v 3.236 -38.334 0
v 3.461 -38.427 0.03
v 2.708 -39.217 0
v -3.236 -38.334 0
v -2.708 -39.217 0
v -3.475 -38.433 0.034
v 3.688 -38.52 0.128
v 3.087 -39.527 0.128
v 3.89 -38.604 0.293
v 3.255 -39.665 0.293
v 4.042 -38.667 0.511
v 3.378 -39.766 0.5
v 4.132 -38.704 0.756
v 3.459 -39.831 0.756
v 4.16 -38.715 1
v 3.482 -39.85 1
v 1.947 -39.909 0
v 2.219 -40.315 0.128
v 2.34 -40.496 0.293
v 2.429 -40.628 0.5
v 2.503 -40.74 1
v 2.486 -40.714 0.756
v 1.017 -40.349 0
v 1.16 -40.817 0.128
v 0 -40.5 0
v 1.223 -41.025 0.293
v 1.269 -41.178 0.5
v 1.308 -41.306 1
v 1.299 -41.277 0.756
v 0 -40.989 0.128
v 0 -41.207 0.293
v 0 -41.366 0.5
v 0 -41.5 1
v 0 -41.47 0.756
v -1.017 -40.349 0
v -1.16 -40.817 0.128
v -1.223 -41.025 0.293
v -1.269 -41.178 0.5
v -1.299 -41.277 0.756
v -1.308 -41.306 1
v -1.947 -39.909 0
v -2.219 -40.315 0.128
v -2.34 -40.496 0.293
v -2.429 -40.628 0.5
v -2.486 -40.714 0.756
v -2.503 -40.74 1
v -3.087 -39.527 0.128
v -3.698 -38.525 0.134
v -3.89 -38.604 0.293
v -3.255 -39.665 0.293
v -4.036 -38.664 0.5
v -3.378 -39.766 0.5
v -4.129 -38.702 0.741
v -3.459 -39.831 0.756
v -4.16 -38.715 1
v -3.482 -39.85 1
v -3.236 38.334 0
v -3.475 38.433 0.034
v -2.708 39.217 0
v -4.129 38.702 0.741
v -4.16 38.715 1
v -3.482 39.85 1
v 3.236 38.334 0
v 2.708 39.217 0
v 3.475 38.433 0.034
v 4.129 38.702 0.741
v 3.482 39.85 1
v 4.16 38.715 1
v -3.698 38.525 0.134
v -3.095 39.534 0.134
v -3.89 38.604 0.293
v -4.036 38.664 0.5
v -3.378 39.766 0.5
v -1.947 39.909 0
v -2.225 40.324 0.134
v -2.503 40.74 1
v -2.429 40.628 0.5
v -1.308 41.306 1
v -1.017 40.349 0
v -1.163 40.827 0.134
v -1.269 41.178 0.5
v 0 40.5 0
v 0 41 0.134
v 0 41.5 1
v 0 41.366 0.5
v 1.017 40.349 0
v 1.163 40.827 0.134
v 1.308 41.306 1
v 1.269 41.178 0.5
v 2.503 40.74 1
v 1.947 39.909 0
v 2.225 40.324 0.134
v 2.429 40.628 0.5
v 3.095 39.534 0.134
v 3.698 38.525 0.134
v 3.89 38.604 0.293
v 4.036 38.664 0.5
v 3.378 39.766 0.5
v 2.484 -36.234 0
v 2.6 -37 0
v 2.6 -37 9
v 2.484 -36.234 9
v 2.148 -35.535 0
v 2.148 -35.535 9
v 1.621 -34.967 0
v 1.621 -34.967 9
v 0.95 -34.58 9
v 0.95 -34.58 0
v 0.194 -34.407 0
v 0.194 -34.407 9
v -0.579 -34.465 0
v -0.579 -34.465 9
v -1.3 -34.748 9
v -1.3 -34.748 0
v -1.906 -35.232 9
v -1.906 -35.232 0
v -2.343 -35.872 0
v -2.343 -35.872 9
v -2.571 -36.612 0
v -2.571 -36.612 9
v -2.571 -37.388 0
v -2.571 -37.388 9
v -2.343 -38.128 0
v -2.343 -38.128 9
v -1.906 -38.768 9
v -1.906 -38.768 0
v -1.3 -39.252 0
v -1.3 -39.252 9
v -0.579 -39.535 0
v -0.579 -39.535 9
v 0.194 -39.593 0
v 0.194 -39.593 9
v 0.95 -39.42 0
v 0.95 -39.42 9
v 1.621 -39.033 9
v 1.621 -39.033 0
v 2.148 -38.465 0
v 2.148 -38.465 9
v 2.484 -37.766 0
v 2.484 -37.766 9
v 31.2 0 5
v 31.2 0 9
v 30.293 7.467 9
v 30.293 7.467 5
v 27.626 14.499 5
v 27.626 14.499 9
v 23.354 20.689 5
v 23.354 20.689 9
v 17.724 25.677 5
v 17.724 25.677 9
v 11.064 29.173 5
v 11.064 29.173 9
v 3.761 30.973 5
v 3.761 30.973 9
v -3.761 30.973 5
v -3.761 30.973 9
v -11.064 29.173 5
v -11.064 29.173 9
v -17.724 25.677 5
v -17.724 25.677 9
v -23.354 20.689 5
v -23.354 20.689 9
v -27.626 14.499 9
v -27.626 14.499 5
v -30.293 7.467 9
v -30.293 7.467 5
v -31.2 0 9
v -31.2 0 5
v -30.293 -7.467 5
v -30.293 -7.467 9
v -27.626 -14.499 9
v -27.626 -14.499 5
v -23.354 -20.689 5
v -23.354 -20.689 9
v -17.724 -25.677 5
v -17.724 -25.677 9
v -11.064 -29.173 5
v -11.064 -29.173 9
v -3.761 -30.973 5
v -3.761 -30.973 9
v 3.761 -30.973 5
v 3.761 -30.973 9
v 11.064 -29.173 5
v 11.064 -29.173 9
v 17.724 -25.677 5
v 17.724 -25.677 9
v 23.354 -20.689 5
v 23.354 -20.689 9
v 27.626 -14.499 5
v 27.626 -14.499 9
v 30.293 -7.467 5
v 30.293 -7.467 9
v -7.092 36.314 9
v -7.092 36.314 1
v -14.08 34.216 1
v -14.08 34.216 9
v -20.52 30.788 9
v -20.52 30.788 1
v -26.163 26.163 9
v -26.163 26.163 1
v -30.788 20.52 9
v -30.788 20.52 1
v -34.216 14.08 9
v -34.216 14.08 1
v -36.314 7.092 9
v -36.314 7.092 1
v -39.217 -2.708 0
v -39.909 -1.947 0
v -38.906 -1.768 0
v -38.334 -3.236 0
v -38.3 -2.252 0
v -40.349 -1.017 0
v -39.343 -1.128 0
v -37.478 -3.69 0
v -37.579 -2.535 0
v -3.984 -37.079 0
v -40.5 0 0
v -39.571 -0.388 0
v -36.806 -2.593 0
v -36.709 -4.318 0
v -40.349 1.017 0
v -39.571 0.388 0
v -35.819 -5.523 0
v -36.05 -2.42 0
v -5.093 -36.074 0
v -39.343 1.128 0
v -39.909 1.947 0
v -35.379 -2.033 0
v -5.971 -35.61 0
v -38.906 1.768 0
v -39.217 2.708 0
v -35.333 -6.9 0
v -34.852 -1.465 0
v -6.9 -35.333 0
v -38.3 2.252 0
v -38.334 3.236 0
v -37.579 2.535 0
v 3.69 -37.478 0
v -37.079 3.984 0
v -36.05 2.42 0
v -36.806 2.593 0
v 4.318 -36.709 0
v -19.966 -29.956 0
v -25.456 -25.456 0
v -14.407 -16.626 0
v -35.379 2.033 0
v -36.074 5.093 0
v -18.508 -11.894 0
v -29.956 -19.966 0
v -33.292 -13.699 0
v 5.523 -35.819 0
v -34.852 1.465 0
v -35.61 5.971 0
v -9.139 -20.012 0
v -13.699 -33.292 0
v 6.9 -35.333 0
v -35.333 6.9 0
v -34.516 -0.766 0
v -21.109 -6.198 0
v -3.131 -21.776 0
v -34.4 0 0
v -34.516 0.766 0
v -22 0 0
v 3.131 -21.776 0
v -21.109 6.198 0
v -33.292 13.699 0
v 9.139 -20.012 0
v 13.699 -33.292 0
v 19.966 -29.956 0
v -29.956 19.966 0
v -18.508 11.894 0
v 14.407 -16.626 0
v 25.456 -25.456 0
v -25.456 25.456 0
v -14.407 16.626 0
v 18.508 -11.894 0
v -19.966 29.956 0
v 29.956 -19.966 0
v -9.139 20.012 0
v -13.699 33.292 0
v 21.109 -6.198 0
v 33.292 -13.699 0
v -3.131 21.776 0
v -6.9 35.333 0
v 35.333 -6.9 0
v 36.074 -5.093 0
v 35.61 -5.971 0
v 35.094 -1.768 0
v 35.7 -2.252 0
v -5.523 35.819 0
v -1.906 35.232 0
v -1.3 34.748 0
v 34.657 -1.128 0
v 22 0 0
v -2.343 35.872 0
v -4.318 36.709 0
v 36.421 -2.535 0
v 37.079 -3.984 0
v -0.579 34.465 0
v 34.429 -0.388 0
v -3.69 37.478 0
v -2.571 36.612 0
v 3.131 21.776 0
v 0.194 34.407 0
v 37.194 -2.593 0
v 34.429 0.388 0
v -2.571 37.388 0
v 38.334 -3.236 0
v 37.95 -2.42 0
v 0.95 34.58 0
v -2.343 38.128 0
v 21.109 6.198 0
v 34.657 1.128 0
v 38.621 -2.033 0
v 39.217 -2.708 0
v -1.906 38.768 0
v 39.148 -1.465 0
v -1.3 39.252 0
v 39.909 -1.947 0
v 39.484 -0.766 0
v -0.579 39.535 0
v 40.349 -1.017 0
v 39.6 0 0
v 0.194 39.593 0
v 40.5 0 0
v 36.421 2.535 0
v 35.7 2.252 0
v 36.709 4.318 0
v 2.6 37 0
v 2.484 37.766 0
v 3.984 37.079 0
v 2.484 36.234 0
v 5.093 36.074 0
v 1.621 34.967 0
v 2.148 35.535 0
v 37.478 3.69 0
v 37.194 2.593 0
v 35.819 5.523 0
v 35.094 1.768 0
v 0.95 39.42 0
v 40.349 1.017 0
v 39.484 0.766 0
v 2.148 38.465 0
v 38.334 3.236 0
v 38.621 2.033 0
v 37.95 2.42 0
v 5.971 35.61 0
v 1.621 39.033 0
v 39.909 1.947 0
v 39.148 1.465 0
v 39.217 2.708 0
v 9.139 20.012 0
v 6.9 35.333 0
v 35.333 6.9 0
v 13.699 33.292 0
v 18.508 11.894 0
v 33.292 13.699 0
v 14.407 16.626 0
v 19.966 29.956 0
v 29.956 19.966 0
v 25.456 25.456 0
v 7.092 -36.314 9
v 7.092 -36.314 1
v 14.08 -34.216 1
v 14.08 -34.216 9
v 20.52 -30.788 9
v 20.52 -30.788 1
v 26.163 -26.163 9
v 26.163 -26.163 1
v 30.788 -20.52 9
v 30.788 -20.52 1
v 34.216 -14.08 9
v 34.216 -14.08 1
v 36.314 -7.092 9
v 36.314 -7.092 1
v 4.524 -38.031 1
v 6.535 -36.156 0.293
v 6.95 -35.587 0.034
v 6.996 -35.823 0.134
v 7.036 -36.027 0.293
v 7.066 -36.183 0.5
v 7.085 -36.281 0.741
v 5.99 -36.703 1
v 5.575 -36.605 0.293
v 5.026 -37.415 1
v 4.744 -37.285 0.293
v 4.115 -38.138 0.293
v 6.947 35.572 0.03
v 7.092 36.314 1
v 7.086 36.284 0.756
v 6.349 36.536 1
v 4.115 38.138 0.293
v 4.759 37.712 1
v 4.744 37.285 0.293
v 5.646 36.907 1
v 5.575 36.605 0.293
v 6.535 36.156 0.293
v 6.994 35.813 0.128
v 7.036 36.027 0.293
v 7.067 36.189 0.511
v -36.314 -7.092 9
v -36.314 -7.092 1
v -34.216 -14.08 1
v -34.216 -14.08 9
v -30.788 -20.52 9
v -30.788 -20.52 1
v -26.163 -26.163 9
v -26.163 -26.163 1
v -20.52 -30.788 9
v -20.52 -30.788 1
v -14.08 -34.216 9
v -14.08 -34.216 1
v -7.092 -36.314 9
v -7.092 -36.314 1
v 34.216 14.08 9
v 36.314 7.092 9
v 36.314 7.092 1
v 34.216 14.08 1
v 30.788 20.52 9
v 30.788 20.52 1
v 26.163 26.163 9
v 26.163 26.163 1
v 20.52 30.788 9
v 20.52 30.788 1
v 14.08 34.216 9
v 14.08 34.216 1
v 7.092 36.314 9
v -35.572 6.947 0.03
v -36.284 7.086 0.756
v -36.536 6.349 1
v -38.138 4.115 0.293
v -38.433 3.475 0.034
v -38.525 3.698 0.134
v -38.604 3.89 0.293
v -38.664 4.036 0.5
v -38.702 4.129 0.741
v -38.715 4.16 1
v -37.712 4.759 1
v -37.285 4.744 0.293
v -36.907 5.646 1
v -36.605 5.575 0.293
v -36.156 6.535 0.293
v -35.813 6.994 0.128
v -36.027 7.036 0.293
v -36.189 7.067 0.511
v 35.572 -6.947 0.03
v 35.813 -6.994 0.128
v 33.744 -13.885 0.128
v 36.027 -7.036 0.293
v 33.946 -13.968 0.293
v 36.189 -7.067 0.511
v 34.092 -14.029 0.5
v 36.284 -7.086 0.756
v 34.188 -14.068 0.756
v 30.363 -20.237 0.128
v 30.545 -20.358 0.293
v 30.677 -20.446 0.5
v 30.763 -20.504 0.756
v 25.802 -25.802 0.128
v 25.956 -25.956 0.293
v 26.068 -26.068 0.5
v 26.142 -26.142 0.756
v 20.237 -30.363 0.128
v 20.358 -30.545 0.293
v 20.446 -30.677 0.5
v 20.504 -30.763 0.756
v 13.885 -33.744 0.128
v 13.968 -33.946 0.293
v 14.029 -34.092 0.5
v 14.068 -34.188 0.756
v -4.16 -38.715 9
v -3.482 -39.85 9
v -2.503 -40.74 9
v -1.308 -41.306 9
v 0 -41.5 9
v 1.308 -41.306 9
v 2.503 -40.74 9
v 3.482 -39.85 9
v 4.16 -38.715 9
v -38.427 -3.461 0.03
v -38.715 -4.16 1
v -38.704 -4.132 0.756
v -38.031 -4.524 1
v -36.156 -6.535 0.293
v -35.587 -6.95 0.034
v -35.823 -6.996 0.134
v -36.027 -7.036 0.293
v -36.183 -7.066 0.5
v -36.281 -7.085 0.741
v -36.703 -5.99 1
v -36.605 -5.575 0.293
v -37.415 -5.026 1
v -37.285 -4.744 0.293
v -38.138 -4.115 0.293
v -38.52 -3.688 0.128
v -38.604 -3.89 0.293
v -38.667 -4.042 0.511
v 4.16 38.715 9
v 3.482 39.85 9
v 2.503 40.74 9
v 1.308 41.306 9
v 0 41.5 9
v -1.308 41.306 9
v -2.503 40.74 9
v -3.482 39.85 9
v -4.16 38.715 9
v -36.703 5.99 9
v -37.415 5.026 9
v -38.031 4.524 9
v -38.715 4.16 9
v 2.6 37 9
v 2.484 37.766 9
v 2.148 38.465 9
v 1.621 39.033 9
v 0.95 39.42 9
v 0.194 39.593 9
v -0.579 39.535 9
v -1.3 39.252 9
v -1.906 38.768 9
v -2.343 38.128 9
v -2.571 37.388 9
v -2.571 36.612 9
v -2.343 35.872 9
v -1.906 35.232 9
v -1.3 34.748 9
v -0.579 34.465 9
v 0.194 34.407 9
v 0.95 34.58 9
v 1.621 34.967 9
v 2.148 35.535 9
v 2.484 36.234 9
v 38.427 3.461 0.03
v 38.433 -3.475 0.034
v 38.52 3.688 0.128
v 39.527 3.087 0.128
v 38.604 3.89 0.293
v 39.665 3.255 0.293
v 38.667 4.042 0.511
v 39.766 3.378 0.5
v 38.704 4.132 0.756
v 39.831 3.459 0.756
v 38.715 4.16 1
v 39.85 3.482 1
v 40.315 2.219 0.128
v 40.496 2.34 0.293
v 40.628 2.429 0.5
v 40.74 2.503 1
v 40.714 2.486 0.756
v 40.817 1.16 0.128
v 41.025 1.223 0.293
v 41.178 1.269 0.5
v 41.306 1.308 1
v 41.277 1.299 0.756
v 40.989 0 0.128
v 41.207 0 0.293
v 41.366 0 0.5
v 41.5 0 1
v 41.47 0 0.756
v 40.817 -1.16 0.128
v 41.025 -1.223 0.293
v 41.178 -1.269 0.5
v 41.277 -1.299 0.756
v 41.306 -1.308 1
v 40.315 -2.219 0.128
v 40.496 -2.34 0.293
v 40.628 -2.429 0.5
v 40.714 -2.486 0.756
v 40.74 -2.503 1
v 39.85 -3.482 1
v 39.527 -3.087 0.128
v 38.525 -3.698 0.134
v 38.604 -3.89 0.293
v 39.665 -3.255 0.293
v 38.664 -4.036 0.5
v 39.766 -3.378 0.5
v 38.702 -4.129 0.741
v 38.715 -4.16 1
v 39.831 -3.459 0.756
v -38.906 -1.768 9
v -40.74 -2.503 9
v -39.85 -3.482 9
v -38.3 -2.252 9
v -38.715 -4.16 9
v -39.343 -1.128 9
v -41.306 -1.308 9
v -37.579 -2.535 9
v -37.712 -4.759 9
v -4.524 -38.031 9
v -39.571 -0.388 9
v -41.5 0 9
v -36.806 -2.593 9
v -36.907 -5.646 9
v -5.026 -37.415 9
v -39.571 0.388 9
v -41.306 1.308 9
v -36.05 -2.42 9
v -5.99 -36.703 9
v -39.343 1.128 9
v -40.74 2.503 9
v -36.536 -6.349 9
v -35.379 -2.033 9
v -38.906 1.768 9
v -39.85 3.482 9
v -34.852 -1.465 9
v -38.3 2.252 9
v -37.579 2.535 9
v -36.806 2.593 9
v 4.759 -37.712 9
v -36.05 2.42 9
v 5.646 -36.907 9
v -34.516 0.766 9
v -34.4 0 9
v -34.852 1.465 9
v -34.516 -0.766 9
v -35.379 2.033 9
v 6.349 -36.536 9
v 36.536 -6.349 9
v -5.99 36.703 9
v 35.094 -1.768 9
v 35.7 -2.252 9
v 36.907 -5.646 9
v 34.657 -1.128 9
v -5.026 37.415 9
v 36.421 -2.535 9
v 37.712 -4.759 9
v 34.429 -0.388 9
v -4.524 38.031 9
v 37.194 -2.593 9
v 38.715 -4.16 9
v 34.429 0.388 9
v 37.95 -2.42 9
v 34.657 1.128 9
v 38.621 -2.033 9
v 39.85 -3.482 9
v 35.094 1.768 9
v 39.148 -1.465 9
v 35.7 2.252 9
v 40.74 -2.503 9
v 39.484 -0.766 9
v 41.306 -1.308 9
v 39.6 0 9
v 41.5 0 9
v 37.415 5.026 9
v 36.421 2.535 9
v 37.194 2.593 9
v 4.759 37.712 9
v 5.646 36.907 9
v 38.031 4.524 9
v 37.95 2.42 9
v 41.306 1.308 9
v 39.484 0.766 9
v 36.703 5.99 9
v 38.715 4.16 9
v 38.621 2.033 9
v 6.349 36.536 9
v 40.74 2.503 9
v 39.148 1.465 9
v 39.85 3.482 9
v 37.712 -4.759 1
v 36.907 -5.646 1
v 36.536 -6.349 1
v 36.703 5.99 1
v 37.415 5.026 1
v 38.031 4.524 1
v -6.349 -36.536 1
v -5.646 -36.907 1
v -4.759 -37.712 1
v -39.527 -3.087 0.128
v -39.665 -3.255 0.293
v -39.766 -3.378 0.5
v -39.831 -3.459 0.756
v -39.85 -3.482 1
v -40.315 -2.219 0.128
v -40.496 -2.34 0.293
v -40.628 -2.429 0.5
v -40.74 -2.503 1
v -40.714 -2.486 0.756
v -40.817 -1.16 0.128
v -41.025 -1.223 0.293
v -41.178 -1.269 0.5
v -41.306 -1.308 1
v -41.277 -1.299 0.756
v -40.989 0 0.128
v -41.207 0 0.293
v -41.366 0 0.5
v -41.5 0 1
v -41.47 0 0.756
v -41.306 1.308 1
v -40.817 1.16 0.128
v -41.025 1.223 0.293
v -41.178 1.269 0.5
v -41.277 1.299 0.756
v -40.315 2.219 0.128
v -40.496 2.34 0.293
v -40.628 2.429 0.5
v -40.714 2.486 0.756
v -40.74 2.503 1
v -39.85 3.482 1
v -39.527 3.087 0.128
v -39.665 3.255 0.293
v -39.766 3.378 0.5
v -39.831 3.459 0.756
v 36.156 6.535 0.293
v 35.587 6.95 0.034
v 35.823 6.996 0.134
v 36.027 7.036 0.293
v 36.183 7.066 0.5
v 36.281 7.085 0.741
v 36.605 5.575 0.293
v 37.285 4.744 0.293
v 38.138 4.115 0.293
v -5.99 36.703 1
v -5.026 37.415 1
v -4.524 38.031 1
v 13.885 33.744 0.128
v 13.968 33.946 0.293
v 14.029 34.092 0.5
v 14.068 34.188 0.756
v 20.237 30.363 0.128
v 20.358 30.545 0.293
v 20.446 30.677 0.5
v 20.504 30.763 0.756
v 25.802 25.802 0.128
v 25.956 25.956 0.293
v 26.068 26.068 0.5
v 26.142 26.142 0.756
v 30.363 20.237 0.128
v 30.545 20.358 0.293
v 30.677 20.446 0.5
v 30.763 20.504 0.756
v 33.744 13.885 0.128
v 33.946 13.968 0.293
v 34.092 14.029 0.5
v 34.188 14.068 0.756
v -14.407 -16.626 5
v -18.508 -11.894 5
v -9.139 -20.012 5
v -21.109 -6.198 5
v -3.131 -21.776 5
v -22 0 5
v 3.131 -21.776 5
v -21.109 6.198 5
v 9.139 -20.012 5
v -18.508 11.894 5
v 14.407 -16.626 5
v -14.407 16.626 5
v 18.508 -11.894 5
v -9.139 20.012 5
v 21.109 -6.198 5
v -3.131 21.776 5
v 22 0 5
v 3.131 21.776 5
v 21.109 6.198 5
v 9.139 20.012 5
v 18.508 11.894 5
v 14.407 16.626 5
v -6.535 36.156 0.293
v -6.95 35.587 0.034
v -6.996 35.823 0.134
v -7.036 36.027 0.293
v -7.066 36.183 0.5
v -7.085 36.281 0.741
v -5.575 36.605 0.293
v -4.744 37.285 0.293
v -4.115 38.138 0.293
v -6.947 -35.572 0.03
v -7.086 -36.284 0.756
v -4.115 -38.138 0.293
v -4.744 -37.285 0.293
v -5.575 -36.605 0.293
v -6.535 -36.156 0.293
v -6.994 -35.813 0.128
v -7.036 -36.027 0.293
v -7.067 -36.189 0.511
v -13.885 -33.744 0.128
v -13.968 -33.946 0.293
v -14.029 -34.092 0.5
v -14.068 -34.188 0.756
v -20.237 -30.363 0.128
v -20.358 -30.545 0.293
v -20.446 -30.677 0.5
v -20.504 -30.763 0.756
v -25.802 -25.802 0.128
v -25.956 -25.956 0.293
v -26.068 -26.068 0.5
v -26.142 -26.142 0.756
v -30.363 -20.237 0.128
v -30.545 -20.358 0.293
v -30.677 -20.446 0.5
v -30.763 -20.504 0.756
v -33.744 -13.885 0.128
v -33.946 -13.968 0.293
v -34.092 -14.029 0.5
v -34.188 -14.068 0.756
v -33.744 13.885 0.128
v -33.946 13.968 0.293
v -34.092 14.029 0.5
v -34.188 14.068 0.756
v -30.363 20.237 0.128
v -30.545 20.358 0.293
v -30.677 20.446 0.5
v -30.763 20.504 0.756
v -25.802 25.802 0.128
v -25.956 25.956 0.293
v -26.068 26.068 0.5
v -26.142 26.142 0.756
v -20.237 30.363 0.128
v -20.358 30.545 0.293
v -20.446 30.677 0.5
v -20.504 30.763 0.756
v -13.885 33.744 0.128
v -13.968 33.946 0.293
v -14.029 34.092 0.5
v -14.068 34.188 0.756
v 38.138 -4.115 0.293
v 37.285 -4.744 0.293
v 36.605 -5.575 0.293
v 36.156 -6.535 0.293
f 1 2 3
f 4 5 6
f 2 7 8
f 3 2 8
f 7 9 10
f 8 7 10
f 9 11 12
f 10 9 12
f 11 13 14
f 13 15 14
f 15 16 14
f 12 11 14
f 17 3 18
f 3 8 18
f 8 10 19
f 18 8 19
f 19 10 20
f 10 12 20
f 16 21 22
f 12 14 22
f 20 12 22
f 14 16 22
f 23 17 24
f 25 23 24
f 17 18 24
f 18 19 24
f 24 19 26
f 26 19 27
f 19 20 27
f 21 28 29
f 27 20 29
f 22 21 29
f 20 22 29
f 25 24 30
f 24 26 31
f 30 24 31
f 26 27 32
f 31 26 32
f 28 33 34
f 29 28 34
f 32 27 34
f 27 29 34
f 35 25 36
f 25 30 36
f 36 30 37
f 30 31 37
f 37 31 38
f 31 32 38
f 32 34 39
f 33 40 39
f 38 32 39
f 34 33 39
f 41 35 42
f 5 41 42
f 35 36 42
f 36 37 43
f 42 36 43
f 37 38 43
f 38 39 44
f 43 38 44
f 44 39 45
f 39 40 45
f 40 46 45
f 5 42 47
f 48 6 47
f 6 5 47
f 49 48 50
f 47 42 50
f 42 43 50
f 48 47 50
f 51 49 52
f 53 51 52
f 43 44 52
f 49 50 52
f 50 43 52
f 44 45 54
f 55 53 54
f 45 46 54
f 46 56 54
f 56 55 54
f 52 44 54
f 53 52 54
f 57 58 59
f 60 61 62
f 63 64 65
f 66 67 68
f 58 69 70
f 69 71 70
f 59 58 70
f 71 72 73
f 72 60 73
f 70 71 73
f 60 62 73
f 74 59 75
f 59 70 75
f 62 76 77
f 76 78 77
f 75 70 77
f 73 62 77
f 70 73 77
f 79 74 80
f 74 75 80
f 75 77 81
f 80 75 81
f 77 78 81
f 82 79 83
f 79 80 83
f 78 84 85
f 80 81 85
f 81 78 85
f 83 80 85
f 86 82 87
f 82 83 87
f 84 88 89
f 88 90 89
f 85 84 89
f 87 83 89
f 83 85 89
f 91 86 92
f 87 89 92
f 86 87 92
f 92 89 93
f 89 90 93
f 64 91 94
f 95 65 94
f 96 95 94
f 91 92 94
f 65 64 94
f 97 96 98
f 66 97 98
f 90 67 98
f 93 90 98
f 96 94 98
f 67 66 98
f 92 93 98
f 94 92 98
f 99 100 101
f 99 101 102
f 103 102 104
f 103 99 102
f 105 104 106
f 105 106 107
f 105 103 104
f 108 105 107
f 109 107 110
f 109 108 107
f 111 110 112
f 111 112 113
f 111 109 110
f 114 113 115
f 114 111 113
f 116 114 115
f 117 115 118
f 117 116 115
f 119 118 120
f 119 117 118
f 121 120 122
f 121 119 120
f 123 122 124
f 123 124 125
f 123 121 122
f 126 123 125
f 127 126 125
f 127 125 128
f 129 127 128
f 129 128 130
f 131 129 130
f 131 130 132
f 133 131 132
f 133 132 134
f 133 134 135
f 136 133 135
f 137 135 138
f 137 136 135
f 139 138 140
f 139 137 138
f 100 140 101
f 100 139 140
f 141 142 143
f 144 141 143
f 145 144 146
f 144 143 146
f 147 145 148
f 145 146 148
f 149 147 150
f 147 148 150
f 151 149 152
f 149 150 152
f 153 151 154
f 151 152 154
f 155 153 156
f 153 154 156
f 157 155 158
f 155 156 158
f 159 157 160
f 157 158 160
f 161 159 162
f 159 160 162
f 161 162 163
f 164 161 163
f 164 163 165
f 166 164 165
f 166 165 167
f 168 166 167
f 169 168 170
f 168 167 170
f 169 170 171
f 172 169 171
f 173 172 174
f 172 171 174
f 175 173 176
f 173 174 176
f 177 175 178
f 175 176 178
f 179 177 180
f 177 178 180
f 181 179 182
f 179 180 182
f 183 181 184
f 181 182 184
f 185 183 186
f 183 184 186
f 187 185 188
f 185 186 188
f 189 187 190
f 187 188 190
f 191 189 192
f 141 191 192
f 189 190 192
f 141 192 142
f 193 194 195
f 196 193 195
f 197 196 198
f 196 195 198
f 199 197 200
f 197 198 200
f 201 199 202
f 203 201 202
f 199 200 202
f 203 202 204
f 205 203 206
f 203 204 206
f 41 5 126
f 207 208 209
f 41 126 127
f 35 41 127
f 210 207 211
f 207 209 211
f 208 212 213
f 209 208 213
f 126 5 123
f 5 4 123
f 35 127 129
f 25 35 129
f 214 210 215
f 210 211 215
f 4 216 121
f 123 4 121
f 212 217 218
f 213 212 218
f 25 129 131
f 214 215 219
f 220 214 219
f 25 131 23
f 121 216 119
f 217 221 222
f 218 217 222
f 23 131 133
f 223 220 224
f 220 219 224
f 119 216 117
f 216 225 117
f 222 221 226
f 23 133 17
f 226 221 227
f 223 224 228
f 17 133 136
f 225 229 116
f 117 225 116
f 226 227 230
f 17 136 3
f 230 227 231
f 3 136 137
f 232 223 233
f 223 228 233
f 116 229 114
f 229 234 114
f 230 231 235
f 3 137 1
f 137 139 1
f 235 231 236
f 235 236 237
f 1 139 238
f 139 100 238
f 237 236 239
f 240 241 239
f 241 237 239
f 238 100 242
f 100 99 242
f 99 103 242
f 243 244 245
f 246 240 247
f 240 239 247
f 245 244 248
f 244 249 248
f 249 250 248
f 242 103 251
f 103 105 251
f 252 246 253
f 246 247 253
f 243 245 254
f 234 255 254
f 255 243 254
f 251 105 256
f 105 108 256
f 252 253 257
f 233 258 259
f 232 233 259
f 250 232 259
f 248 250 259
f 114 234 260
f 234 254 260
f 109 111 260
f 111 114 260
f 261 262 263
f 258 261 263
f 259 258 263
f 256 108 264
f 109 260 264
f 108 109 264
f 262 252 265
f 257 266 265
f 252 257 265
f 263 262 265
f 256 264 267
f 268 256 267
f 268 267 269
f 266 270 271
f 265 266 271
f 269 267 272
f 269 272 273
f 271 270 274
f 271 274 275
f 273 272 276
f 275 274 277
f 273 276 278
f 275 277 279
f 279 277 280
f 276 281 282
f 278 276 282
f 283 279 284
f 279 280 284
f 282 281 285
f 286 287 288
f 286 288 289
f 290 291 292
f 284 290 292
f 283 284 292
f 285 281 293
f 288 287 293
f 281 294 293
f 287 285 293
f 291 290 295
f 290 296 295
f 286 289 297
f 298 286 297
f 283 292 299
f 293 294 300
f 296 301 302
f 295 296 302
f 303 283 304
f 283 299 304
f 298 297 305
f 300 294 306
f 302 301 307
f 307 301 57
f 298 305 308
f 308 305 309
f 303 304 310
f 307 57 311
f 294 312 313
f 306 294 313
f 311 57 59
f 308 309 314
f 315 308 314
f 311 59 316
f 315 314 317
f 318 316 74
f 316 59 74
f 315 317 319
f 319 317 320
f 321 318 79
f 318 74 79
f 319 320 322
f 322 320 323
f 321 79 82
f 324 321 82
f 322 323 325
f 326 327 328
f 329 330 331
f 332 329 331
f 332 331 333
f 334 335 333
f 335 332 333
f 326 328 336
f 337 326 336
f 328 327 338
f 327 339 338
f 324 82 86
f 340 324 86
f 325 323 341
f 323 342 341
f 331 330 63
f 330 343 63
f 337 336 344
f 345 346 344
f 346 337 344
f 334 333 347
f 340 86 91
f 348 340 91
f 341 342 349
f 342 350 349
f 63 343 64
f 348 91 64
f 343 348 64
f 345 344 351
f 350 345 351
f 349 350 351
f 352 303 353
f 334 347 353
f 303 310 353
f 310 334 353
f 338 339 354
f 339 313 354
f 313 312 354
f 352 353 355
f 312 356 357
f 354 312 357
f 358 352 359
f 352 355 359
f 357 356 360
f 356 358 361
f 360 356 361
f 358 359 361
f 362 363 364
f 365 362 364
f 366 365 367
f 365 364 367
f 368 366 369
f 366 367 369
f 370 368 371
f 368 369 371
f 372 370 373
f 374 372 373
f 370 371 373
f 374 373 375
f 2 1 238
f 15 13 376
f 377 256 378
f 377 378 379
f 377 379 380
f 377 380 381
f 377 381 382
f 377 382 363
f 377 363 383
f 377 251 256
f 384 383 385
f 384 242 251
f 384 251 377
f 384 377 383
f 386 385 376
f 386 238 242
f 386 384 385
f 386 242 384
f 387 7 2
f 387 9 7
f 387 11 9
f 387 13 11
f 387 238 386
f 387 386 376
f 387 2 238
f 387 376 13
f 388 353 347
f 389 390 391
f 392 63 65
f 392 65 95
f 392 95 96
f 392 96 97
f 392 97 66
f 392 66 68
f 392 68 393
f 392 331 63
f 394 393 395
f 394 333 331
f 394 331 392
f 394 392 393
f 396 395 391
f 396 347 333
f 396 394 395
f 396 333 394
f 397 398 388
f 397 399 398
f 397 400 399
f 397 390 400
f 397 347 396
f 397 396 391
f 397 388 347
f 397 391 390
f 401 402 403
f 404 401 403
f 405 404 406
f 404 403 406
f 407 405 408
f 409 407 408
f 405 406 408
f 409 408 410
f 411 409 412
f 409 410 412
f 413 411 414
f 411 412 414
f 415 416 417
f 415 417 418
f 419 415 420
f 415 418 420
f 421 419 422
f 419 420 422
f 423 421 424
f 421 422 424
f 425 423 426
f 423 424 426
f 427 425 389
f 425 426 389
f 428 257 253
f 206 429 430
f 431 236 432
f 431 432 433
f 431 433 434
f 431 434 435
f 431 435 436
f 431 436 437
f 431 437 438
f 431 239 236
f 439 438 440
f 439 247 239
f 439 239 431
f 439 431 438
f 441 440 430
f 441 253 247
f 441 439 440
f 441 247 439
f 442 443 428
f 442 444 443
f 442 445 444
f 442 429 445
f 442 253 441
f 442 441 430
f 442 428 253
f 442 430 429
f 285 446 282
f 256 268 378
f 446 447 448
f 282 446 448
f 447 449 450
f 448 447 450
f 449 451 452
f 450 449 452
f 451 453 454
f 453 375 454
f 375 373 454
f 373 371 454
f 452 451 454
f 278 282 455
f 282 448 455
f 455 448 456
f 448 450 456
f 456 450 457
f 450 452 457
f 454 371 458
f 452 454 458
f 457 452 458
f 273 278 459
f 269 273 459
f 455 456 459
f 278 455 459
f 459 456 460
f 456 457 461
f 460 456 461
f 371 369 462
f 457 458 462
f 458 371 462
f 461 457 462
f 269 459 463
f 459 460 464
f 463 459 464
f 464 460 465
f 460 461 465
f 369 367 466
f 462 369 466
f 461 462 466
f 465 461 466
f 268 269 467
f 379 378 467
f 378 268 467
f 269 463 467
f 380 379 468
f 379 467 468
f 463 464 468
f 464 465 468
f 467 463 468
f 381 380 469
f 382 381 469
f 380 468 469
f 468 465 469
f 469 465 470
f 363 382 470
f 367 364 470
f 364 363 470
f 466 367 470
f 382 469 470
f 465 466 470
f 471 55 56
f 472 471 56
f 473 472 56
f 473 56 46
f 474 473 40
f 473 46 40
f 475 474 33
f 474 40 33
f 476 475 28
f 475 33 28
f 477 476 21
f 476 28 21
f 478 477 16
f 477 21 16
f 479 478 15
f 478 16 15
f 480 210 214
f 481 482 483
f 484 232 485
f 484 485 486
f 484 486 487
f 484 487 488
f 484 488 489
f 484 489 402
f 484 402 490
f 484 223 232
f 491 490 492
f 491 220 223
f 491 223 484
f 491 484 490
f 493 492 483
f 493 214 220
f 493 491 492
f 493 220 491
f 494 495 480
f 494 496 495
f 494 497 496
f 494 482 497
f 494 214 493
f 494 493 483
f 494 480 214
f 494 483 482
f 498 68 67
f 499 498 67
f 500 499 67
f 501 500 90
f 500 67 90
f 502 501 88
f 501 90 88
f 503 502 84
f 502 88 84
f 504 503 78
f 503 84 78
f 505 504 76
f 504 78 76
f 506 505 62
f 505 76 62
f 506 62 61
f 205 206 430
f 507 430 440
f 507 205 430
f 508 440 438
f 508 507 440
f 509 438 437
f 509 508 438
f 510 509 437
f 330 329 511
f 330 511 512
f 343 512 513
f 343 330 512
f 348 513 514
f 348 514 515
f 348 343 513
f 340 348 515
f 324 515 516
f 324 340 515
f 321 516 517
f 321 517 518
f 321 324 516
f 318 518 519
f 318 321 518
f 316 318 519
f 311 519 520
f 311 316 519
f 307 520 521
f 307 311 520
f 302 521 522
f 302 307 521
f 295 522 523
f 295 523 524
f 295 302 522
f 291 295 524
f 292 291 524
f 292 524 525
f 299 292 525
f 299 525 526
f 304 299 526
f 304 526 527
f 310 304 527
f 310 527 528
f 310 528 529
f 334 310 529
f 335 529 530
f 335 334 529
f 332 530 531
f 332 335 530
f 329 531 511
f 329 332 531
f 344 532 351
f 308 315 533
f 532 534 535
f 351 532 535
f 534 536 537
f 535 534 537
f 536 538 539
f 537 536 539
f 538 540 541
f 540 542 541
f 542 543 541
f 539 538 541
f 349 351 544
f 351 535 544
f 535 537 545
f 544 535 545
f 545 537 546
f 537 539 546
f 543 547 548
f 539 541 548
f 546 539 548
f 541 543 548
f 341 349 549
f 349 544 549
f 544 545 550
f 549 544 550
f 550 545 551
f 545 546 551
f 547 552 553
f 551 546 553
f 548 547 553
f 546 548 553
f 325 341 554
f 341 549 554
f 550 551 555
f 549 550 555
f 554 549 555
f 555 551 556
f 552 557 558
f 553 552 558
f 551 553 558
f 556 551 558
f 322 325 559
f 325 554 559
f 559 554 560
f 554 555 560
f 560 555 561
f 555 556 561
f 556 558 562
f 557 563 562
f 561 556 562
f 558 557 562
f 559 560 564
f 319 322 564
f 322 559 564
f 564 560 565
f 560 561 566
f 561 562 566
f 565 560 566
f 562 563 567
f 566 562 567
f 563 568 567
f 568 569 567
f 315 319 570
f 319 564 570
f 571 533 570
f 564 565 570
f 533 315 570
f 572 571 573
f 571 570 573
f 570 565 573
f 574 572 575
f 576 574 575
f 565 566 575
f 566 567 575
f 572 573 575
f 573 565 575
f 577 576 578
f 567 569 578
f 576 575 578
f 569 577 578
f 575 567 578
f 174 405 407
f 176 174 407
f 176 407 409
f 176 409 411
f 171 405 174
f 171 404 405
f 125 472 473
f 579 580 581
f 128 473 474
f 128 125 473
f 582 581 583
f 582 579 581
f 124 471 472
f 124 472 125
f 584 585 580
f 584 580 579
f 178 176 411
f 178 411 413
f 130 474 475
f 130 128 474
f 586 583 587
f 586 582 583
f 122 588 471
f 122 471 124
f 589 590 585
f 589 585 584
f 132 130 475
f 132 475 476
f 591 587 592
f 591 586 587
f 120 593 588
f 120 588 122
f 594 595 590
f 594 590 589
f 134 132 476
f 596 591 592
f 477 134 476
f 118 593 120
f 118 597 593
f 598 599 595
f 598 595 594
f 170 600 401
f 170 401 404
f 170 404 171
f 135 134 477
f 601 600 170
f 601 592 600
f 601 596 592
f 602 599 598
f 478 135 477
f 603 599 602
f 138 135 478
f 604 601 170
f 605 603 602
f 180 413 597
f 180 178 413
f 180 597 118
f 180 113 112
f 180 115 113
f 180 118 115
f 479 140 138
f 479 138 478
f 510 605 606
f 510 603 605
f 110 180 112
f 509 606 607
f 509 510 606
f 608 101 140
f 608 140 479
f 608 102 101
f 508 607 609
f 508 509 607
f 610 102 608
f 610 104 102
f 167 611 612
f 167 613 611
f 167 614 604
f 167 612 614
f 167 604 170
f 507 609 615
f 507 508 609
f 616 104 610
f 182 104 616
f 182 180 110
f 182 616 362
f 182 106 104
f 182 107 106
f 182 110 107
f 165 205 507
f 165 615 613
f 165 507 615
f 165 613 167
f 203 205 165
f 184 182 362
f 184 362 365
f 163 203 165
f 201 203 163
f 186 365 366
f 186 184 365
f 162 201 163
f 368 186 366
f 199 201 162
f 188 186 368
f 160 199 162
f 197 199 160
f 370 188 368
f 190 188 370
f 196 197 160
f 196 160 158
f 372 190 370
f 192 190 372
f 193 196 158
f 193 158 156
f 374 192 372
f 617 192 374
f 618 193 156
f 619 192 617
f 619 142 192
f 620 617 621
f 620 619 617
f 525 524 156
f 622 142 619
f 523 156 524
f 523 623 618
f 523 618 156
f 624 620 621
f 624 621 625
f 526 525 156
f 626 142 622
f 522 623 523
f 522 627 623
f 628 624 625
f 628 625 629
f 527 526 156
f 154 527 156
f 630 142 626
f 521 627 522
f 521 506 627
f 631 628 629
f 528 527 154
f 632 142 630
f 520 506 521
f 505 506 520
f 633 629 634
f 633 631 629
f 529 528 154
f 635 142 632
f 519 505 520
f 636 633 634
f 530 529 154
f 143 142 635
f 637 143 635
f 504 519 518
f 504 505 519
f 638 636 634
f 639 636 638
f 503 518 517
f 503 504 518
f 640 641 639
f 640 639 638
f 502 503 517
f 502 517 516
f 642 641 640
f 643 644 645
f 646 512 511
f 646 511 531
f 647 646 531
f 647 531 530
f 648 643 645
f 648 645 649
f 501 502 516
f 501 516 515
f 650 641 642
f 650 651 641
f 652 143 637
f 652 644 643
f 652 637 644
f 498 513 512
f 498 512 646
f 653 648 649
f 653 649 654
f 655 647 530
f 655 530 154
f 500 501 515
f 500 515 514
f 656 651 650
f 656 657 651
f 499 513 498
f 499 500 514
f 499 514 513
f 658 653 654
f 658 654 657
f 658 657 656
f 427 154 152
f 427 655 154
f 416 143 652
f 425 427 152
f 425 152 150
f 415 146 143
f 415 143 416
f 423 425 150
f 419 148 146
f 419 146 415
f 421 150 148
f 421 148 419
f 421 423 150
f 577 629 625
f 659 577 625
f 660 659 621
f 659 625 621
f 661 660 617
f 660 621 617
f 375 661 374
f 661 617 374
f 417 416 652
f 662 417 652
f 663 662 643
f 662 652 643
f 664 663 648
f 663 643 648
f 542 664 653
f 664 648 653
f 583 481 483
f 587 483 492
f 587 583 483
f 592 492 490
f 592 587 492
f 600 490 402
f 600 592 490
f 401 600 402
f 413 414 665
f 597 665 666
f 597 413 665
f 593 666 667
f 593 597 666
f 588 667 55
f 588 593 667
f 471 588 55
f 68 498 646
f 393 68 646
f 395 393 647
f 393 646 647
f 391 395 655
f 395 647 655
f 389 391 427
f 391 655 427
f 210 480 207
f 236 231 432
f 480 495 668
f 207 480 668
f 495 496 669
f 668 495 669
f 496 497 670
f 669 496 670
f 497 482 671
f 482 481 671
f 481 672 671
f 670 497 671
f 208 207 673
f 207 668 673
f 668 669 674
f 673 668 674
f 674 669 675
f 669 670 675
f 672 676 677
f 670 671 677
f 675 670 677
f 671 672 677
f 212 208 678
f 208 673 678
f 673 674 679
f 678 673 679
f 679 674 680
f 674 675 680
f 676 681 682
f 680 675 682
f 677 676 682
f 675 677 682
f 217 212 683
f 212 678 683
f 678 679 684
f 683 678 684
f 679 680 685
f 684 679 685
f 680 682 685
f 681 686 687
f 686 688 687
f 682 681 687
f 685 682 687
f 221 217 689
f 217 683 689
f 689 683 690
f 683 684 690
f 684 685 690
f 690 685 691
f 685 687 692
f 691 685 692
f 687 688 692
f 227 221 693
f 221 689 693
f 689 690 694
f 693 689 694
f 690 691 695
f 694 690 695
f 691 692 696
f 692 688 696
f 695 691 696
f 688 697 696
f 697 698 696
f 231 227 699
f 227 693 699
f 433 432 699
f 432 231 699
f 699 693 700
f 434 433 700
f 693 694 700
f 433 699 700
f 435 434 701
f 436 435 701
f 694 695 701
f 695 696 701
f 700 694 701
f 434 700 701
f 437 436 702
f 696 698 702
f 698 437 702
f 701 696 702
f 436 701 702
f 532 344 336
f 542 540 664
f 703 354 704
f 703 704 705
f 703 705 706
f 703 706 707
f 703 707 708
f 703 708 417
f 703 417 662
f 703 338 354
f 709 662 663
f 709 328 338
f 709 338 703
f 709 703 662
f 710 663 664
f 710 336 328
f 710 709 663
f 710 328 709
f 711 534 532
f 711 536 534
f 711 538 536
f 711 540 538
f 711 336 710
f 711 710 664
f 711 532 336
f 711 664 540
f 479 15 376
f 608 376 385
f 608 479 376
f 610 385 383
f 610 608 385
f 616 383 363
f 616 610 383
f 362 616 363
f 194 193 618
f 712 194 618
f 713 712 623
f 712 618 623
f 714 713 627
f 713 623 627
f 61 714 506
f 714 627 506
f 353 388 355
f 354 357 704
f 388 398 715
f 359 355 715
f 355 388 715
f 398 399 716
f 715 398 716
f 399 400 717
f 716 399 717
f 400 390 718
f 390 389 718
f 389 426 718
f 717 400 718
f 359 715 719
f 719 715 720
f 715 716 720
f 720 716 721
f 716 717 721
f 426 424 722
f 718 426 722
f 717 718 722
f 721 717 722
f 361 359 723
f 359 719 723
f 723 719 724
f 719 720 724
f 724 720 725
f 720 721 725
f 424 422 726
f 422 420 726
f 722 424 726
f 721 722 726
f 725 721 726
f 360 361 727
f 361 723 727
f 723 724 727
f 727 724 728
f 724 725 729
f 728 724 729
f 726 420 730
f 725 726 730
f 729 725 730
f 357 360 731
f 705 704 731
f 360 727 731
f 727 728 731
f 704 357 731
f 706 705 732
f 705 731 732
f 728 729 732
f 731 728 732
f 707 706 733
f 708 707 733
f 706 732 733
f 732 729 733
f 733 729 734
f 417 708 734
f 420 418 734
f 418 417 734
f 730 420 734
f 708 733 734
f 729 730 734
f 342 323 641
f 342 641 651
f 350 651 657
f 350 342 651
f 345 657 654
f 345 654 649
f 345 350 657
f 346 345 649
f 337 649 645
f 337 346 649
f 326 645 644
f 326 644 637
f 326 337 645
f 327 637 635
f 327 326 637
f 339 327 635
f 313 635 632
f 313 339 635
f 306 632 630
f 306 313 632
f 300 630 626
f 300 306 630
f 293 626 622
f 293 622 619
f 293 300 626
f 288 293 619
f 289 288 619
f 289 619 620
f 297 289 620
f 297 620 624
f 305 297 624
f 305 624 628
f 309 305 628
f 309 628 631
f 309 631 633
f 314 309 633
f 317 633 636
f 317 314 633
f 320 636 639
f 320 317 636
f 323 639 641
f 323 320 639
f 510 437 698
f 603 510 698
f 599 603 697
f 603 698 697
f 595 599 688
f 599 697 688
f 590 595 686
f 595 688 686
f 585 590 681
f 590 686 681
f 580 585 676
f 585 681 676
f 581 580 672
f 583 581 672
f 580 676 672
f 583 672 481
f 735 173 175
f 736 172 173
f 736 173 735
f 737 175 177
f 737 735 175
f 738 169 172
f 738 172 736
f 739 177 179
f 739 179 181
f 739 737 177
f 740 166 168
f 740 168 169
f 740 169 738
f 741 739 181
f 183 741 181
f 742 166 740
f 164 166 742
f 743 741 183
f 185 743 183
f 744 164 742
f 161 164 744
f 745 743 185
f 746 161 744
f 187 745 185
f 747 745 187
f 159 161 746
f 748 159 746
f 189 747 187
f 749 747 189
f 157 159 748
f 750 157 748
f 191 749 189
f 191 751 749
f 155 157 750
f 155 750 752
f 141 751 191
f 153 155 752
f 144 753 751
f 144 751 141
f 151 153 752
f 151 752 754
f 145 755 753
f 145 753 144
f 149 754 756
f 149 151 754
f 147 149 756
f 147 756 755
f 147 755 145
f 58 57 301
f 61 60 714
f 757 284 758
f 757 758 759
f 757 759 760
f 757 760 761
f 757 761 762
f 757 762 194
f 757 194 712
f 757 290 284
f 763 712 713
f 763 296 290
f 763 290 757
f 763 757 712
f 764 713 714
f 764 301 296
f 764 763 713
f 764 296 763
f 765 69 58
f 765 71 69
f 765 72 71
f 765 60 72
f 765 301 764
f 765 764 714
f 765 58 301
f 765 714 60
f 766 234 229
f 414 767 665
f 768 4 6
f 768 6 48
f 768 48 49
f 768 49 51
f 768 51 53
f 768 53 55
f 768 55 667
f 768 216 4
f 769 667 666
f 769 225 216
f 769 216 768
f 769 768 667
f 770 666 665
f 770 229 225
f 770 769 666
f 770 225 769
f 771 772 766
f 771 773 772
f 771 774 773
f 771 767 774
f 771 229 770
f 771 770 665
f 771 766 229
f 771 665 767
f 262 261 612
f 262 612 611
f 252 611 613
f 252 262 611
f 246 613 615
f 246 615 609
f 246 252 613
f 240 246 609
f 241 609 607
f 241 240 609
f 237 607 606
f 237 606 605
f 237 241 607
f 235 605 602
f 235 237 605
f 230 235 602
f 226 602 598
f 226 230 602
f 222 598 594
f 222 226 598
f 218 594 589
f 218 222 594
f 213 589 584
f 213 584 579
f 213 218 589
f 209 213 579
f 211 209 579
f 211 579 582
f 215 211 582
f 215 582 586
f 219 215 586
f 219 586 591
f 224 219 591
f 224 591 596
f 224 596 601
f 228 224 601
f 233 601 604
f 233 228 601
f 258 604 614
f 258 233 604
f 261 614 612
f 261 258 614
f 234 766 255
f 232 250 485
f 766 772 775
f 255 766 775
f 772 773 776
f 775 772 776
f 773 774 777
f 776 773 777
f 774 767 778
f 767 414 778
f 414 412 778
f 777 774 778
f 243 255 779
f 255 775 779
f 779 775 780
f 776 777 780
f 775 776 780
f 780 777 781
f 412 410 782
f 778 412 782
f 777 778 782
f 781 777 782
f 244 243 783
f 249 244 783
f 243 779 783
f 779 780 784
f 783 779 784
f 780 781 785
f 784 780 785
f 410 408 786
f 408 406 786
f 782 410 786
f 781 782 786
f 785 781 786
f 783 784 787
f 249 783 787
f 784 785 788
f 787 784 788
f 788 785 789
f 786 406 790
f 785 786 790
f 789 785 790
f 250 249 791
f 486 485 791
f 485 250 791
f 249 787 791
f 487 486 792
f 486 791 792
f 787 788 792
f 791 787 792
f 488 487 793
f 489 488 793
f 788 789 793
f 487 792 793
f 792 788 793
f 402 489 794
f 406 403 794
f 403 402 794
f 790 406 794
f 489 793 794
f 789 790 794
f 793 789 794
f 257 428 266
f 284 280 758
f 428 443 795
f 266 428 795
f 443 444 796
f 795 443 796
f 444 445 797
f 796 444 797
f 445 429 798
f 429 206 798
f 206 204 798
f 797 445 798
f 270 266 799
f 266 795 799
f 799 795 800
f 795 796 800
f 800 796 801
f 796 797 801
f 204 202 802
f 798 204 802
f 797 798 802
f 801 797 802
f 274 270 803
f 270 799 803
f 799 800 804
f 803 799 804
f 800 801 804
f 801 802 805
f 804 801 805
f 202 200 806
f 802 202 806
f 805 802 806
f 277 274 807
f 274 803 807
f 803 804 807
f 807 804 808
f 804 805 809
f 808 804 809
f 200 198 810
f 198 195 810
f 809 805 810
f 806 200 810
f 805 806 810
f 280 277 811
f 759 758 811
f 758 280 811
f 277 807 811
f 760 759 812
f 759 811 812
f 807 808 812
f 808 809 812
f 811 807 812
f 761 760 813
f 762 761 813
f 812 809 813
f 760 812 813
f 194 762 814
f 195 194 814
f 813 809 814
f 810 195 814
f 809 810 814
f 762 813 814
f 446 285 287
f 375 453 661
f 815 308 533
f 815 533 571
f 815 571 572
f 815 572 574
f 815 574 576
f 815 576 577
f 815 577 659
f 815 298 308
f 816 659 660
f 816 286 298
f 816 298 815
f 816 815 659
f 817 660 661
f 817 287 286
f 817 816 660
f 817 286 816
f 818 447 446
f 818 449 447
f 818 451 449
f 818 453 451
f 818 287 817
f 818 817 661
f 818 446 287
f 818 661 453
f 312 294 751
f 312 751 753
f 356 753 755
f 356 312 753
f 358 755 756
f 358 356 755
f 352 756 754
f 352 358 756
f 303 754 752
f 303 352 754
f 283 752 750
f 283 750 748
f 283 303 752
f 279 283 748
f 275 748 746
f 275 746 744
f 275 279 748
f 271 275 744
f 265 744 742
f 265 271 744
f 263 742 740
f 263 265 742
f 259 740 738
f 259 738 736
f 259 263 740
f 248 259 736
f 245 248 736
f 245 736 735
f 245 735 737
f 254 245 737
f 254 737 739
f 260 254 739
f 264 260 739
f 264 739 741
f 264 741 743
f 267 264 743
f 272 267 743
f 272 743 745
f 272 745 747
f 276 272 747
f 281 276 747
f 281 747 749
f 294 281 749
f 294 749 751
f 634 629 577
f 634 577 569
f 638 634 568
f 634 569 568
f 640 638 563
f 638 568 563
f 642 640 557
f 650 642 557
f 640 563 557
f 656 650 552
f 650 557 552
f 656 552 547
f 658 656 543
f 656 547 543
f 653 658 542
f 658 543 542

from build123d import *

# Parameters (mm, degrees)
SKETCH_R      = 22
SKETCH_R_2    = 2.6
PAD_DEPTH     = 9
SKETCH001_R   = 31.2
SKETCH001_R_2 = 22
POCKET_DEPTH  = 4
FILLET_R      = 4
FILLET001_R   = 1


with BuildPart() as part:
    # Sketch → Pad (new body)
    with BuildSketch(Plane.XY):
        with BuildLine():
            ThreePointArc((-4.5, 36.725332), (-26.162951, 26.162951), (-36.725332, 4.5))
            Line((-37.000025, 4.5), (-36.725332, 4.5))
            ThreePointArc((-37.000025, 4.5), (-41.5, 0), (-37.000025, -4.5))
            Line((-37.000025, -4.5), (-36.725332, -4.5))
            ThreePointArc((-36.725332, -4.5), (-26.162951, -26.162951), (-4.5, -36.725332))
            Line((-4.5, -36.725332), (-4.5, -37))
            ThreePointArc((-4.5, -37), (0, -41.5), (4.5, -37.000001))
            Line((4.5, -36.725332), (4.5, -37.000001))
            ThreePointArc((4.5, -36.725332), (26.162951, -26.162951), (36.725332, -4.5))
            Line((36.725332, -4.5), (37.000003, -4.5))
            ThreePointArc((37.000003, -4.5), (41.5, 0), (37.000003, 4.5))
            Line((36.725332, 4.5), (37.000003, 4.5))
            ThreePointArc((36.725332, 4.5), (26.162951, 26.162951), (4.5, 36.725332))
            Line((4.5, 36.999999), (4.5, 36.725332))
            ThreePointArc((4.5, 36.999999), (1.1e-05, 41.5), (-4.5, 37.000021))
            Line((-4.5, 37.000021), (-4.5, 36.725332))
        make_face()
        Circle(SKETCH_R, mode=Mode.SUBTRACT)
        with Locations((0, 37)):
            Circle(SKETCH_R_2, mode=Mode.SUBTRACT)
        with Locations((0, -37)):
            Circle(SKETCH_R_2, mode=Mode.SUBTRACT)
        with Locations((-37, 0)):
            Circle(SKETCH_R_2, mode=Mode.SUBTRACT)
        with Locations((37, 0)):
            Circle(SKETCH_R_2, mode=Mode.SUBTRACT)
    extrude(amount=PAD_DEPTH)

    # Sketch001 → Pocket (cut)
    with BuildSketch(Plane.XY.offset(9)):
        Circle(SKETCH001_R)
        Circle(SKETCH001_R_2, mode=Mode.SUBTRACT)
    extrude(amount=-POCKET_DEPTH, mode=Mode.SUBTRACT)

    # Fillet
    fillet_edges = [part.edges().sort_by_distance(p)[0] for p in [
        (-36.725332, 4.5, 4.5),
        (-4.5, 36.725332, 4.5),
        (4.5, 36.725332, 4.5),
        (36.725332, 4.5, 4.5),
        (36.725332, -4.5, 4.5),
        (4.5, -36.725332, 4.5),
        (-4.5, -36.725332, 4.5),
        (-36.725332, -4.5, 4.5),
    ]]
    fillet(fillet_edges, radius=FILLET_R)

    # Fillet001
    fillet001_edges = [part.edges().sort_by_distance(p)[0] for p in [
        (-5.323601, 37.145487, 0),
        (-26.162951, 26.162951, 0),
        (0, 41.5, 0),
        (5.323601, 37.145487, 0),
        (26.162951, 26.162951, 0),
        (37.145487, 5.323601, 0),
        (41.5, 0, 0),
        (37.145487, -5.323601, 0),
        (26.162951, -26.162951, 0),
        (5.323601, -37.145487, 0),
        (0, -41.5, 0),
        (-5.323601, -37.145487, 0),
        (-26.162951, -26.162951, 0),
        (-37.145487, -5.323601, 0),
        (-41.5, 0, 0),
        (-37.145487, 5.323601, 0),
    ]]
    fillet(fillet001_edges, radius=FILLET001_R)


solid = part.part
